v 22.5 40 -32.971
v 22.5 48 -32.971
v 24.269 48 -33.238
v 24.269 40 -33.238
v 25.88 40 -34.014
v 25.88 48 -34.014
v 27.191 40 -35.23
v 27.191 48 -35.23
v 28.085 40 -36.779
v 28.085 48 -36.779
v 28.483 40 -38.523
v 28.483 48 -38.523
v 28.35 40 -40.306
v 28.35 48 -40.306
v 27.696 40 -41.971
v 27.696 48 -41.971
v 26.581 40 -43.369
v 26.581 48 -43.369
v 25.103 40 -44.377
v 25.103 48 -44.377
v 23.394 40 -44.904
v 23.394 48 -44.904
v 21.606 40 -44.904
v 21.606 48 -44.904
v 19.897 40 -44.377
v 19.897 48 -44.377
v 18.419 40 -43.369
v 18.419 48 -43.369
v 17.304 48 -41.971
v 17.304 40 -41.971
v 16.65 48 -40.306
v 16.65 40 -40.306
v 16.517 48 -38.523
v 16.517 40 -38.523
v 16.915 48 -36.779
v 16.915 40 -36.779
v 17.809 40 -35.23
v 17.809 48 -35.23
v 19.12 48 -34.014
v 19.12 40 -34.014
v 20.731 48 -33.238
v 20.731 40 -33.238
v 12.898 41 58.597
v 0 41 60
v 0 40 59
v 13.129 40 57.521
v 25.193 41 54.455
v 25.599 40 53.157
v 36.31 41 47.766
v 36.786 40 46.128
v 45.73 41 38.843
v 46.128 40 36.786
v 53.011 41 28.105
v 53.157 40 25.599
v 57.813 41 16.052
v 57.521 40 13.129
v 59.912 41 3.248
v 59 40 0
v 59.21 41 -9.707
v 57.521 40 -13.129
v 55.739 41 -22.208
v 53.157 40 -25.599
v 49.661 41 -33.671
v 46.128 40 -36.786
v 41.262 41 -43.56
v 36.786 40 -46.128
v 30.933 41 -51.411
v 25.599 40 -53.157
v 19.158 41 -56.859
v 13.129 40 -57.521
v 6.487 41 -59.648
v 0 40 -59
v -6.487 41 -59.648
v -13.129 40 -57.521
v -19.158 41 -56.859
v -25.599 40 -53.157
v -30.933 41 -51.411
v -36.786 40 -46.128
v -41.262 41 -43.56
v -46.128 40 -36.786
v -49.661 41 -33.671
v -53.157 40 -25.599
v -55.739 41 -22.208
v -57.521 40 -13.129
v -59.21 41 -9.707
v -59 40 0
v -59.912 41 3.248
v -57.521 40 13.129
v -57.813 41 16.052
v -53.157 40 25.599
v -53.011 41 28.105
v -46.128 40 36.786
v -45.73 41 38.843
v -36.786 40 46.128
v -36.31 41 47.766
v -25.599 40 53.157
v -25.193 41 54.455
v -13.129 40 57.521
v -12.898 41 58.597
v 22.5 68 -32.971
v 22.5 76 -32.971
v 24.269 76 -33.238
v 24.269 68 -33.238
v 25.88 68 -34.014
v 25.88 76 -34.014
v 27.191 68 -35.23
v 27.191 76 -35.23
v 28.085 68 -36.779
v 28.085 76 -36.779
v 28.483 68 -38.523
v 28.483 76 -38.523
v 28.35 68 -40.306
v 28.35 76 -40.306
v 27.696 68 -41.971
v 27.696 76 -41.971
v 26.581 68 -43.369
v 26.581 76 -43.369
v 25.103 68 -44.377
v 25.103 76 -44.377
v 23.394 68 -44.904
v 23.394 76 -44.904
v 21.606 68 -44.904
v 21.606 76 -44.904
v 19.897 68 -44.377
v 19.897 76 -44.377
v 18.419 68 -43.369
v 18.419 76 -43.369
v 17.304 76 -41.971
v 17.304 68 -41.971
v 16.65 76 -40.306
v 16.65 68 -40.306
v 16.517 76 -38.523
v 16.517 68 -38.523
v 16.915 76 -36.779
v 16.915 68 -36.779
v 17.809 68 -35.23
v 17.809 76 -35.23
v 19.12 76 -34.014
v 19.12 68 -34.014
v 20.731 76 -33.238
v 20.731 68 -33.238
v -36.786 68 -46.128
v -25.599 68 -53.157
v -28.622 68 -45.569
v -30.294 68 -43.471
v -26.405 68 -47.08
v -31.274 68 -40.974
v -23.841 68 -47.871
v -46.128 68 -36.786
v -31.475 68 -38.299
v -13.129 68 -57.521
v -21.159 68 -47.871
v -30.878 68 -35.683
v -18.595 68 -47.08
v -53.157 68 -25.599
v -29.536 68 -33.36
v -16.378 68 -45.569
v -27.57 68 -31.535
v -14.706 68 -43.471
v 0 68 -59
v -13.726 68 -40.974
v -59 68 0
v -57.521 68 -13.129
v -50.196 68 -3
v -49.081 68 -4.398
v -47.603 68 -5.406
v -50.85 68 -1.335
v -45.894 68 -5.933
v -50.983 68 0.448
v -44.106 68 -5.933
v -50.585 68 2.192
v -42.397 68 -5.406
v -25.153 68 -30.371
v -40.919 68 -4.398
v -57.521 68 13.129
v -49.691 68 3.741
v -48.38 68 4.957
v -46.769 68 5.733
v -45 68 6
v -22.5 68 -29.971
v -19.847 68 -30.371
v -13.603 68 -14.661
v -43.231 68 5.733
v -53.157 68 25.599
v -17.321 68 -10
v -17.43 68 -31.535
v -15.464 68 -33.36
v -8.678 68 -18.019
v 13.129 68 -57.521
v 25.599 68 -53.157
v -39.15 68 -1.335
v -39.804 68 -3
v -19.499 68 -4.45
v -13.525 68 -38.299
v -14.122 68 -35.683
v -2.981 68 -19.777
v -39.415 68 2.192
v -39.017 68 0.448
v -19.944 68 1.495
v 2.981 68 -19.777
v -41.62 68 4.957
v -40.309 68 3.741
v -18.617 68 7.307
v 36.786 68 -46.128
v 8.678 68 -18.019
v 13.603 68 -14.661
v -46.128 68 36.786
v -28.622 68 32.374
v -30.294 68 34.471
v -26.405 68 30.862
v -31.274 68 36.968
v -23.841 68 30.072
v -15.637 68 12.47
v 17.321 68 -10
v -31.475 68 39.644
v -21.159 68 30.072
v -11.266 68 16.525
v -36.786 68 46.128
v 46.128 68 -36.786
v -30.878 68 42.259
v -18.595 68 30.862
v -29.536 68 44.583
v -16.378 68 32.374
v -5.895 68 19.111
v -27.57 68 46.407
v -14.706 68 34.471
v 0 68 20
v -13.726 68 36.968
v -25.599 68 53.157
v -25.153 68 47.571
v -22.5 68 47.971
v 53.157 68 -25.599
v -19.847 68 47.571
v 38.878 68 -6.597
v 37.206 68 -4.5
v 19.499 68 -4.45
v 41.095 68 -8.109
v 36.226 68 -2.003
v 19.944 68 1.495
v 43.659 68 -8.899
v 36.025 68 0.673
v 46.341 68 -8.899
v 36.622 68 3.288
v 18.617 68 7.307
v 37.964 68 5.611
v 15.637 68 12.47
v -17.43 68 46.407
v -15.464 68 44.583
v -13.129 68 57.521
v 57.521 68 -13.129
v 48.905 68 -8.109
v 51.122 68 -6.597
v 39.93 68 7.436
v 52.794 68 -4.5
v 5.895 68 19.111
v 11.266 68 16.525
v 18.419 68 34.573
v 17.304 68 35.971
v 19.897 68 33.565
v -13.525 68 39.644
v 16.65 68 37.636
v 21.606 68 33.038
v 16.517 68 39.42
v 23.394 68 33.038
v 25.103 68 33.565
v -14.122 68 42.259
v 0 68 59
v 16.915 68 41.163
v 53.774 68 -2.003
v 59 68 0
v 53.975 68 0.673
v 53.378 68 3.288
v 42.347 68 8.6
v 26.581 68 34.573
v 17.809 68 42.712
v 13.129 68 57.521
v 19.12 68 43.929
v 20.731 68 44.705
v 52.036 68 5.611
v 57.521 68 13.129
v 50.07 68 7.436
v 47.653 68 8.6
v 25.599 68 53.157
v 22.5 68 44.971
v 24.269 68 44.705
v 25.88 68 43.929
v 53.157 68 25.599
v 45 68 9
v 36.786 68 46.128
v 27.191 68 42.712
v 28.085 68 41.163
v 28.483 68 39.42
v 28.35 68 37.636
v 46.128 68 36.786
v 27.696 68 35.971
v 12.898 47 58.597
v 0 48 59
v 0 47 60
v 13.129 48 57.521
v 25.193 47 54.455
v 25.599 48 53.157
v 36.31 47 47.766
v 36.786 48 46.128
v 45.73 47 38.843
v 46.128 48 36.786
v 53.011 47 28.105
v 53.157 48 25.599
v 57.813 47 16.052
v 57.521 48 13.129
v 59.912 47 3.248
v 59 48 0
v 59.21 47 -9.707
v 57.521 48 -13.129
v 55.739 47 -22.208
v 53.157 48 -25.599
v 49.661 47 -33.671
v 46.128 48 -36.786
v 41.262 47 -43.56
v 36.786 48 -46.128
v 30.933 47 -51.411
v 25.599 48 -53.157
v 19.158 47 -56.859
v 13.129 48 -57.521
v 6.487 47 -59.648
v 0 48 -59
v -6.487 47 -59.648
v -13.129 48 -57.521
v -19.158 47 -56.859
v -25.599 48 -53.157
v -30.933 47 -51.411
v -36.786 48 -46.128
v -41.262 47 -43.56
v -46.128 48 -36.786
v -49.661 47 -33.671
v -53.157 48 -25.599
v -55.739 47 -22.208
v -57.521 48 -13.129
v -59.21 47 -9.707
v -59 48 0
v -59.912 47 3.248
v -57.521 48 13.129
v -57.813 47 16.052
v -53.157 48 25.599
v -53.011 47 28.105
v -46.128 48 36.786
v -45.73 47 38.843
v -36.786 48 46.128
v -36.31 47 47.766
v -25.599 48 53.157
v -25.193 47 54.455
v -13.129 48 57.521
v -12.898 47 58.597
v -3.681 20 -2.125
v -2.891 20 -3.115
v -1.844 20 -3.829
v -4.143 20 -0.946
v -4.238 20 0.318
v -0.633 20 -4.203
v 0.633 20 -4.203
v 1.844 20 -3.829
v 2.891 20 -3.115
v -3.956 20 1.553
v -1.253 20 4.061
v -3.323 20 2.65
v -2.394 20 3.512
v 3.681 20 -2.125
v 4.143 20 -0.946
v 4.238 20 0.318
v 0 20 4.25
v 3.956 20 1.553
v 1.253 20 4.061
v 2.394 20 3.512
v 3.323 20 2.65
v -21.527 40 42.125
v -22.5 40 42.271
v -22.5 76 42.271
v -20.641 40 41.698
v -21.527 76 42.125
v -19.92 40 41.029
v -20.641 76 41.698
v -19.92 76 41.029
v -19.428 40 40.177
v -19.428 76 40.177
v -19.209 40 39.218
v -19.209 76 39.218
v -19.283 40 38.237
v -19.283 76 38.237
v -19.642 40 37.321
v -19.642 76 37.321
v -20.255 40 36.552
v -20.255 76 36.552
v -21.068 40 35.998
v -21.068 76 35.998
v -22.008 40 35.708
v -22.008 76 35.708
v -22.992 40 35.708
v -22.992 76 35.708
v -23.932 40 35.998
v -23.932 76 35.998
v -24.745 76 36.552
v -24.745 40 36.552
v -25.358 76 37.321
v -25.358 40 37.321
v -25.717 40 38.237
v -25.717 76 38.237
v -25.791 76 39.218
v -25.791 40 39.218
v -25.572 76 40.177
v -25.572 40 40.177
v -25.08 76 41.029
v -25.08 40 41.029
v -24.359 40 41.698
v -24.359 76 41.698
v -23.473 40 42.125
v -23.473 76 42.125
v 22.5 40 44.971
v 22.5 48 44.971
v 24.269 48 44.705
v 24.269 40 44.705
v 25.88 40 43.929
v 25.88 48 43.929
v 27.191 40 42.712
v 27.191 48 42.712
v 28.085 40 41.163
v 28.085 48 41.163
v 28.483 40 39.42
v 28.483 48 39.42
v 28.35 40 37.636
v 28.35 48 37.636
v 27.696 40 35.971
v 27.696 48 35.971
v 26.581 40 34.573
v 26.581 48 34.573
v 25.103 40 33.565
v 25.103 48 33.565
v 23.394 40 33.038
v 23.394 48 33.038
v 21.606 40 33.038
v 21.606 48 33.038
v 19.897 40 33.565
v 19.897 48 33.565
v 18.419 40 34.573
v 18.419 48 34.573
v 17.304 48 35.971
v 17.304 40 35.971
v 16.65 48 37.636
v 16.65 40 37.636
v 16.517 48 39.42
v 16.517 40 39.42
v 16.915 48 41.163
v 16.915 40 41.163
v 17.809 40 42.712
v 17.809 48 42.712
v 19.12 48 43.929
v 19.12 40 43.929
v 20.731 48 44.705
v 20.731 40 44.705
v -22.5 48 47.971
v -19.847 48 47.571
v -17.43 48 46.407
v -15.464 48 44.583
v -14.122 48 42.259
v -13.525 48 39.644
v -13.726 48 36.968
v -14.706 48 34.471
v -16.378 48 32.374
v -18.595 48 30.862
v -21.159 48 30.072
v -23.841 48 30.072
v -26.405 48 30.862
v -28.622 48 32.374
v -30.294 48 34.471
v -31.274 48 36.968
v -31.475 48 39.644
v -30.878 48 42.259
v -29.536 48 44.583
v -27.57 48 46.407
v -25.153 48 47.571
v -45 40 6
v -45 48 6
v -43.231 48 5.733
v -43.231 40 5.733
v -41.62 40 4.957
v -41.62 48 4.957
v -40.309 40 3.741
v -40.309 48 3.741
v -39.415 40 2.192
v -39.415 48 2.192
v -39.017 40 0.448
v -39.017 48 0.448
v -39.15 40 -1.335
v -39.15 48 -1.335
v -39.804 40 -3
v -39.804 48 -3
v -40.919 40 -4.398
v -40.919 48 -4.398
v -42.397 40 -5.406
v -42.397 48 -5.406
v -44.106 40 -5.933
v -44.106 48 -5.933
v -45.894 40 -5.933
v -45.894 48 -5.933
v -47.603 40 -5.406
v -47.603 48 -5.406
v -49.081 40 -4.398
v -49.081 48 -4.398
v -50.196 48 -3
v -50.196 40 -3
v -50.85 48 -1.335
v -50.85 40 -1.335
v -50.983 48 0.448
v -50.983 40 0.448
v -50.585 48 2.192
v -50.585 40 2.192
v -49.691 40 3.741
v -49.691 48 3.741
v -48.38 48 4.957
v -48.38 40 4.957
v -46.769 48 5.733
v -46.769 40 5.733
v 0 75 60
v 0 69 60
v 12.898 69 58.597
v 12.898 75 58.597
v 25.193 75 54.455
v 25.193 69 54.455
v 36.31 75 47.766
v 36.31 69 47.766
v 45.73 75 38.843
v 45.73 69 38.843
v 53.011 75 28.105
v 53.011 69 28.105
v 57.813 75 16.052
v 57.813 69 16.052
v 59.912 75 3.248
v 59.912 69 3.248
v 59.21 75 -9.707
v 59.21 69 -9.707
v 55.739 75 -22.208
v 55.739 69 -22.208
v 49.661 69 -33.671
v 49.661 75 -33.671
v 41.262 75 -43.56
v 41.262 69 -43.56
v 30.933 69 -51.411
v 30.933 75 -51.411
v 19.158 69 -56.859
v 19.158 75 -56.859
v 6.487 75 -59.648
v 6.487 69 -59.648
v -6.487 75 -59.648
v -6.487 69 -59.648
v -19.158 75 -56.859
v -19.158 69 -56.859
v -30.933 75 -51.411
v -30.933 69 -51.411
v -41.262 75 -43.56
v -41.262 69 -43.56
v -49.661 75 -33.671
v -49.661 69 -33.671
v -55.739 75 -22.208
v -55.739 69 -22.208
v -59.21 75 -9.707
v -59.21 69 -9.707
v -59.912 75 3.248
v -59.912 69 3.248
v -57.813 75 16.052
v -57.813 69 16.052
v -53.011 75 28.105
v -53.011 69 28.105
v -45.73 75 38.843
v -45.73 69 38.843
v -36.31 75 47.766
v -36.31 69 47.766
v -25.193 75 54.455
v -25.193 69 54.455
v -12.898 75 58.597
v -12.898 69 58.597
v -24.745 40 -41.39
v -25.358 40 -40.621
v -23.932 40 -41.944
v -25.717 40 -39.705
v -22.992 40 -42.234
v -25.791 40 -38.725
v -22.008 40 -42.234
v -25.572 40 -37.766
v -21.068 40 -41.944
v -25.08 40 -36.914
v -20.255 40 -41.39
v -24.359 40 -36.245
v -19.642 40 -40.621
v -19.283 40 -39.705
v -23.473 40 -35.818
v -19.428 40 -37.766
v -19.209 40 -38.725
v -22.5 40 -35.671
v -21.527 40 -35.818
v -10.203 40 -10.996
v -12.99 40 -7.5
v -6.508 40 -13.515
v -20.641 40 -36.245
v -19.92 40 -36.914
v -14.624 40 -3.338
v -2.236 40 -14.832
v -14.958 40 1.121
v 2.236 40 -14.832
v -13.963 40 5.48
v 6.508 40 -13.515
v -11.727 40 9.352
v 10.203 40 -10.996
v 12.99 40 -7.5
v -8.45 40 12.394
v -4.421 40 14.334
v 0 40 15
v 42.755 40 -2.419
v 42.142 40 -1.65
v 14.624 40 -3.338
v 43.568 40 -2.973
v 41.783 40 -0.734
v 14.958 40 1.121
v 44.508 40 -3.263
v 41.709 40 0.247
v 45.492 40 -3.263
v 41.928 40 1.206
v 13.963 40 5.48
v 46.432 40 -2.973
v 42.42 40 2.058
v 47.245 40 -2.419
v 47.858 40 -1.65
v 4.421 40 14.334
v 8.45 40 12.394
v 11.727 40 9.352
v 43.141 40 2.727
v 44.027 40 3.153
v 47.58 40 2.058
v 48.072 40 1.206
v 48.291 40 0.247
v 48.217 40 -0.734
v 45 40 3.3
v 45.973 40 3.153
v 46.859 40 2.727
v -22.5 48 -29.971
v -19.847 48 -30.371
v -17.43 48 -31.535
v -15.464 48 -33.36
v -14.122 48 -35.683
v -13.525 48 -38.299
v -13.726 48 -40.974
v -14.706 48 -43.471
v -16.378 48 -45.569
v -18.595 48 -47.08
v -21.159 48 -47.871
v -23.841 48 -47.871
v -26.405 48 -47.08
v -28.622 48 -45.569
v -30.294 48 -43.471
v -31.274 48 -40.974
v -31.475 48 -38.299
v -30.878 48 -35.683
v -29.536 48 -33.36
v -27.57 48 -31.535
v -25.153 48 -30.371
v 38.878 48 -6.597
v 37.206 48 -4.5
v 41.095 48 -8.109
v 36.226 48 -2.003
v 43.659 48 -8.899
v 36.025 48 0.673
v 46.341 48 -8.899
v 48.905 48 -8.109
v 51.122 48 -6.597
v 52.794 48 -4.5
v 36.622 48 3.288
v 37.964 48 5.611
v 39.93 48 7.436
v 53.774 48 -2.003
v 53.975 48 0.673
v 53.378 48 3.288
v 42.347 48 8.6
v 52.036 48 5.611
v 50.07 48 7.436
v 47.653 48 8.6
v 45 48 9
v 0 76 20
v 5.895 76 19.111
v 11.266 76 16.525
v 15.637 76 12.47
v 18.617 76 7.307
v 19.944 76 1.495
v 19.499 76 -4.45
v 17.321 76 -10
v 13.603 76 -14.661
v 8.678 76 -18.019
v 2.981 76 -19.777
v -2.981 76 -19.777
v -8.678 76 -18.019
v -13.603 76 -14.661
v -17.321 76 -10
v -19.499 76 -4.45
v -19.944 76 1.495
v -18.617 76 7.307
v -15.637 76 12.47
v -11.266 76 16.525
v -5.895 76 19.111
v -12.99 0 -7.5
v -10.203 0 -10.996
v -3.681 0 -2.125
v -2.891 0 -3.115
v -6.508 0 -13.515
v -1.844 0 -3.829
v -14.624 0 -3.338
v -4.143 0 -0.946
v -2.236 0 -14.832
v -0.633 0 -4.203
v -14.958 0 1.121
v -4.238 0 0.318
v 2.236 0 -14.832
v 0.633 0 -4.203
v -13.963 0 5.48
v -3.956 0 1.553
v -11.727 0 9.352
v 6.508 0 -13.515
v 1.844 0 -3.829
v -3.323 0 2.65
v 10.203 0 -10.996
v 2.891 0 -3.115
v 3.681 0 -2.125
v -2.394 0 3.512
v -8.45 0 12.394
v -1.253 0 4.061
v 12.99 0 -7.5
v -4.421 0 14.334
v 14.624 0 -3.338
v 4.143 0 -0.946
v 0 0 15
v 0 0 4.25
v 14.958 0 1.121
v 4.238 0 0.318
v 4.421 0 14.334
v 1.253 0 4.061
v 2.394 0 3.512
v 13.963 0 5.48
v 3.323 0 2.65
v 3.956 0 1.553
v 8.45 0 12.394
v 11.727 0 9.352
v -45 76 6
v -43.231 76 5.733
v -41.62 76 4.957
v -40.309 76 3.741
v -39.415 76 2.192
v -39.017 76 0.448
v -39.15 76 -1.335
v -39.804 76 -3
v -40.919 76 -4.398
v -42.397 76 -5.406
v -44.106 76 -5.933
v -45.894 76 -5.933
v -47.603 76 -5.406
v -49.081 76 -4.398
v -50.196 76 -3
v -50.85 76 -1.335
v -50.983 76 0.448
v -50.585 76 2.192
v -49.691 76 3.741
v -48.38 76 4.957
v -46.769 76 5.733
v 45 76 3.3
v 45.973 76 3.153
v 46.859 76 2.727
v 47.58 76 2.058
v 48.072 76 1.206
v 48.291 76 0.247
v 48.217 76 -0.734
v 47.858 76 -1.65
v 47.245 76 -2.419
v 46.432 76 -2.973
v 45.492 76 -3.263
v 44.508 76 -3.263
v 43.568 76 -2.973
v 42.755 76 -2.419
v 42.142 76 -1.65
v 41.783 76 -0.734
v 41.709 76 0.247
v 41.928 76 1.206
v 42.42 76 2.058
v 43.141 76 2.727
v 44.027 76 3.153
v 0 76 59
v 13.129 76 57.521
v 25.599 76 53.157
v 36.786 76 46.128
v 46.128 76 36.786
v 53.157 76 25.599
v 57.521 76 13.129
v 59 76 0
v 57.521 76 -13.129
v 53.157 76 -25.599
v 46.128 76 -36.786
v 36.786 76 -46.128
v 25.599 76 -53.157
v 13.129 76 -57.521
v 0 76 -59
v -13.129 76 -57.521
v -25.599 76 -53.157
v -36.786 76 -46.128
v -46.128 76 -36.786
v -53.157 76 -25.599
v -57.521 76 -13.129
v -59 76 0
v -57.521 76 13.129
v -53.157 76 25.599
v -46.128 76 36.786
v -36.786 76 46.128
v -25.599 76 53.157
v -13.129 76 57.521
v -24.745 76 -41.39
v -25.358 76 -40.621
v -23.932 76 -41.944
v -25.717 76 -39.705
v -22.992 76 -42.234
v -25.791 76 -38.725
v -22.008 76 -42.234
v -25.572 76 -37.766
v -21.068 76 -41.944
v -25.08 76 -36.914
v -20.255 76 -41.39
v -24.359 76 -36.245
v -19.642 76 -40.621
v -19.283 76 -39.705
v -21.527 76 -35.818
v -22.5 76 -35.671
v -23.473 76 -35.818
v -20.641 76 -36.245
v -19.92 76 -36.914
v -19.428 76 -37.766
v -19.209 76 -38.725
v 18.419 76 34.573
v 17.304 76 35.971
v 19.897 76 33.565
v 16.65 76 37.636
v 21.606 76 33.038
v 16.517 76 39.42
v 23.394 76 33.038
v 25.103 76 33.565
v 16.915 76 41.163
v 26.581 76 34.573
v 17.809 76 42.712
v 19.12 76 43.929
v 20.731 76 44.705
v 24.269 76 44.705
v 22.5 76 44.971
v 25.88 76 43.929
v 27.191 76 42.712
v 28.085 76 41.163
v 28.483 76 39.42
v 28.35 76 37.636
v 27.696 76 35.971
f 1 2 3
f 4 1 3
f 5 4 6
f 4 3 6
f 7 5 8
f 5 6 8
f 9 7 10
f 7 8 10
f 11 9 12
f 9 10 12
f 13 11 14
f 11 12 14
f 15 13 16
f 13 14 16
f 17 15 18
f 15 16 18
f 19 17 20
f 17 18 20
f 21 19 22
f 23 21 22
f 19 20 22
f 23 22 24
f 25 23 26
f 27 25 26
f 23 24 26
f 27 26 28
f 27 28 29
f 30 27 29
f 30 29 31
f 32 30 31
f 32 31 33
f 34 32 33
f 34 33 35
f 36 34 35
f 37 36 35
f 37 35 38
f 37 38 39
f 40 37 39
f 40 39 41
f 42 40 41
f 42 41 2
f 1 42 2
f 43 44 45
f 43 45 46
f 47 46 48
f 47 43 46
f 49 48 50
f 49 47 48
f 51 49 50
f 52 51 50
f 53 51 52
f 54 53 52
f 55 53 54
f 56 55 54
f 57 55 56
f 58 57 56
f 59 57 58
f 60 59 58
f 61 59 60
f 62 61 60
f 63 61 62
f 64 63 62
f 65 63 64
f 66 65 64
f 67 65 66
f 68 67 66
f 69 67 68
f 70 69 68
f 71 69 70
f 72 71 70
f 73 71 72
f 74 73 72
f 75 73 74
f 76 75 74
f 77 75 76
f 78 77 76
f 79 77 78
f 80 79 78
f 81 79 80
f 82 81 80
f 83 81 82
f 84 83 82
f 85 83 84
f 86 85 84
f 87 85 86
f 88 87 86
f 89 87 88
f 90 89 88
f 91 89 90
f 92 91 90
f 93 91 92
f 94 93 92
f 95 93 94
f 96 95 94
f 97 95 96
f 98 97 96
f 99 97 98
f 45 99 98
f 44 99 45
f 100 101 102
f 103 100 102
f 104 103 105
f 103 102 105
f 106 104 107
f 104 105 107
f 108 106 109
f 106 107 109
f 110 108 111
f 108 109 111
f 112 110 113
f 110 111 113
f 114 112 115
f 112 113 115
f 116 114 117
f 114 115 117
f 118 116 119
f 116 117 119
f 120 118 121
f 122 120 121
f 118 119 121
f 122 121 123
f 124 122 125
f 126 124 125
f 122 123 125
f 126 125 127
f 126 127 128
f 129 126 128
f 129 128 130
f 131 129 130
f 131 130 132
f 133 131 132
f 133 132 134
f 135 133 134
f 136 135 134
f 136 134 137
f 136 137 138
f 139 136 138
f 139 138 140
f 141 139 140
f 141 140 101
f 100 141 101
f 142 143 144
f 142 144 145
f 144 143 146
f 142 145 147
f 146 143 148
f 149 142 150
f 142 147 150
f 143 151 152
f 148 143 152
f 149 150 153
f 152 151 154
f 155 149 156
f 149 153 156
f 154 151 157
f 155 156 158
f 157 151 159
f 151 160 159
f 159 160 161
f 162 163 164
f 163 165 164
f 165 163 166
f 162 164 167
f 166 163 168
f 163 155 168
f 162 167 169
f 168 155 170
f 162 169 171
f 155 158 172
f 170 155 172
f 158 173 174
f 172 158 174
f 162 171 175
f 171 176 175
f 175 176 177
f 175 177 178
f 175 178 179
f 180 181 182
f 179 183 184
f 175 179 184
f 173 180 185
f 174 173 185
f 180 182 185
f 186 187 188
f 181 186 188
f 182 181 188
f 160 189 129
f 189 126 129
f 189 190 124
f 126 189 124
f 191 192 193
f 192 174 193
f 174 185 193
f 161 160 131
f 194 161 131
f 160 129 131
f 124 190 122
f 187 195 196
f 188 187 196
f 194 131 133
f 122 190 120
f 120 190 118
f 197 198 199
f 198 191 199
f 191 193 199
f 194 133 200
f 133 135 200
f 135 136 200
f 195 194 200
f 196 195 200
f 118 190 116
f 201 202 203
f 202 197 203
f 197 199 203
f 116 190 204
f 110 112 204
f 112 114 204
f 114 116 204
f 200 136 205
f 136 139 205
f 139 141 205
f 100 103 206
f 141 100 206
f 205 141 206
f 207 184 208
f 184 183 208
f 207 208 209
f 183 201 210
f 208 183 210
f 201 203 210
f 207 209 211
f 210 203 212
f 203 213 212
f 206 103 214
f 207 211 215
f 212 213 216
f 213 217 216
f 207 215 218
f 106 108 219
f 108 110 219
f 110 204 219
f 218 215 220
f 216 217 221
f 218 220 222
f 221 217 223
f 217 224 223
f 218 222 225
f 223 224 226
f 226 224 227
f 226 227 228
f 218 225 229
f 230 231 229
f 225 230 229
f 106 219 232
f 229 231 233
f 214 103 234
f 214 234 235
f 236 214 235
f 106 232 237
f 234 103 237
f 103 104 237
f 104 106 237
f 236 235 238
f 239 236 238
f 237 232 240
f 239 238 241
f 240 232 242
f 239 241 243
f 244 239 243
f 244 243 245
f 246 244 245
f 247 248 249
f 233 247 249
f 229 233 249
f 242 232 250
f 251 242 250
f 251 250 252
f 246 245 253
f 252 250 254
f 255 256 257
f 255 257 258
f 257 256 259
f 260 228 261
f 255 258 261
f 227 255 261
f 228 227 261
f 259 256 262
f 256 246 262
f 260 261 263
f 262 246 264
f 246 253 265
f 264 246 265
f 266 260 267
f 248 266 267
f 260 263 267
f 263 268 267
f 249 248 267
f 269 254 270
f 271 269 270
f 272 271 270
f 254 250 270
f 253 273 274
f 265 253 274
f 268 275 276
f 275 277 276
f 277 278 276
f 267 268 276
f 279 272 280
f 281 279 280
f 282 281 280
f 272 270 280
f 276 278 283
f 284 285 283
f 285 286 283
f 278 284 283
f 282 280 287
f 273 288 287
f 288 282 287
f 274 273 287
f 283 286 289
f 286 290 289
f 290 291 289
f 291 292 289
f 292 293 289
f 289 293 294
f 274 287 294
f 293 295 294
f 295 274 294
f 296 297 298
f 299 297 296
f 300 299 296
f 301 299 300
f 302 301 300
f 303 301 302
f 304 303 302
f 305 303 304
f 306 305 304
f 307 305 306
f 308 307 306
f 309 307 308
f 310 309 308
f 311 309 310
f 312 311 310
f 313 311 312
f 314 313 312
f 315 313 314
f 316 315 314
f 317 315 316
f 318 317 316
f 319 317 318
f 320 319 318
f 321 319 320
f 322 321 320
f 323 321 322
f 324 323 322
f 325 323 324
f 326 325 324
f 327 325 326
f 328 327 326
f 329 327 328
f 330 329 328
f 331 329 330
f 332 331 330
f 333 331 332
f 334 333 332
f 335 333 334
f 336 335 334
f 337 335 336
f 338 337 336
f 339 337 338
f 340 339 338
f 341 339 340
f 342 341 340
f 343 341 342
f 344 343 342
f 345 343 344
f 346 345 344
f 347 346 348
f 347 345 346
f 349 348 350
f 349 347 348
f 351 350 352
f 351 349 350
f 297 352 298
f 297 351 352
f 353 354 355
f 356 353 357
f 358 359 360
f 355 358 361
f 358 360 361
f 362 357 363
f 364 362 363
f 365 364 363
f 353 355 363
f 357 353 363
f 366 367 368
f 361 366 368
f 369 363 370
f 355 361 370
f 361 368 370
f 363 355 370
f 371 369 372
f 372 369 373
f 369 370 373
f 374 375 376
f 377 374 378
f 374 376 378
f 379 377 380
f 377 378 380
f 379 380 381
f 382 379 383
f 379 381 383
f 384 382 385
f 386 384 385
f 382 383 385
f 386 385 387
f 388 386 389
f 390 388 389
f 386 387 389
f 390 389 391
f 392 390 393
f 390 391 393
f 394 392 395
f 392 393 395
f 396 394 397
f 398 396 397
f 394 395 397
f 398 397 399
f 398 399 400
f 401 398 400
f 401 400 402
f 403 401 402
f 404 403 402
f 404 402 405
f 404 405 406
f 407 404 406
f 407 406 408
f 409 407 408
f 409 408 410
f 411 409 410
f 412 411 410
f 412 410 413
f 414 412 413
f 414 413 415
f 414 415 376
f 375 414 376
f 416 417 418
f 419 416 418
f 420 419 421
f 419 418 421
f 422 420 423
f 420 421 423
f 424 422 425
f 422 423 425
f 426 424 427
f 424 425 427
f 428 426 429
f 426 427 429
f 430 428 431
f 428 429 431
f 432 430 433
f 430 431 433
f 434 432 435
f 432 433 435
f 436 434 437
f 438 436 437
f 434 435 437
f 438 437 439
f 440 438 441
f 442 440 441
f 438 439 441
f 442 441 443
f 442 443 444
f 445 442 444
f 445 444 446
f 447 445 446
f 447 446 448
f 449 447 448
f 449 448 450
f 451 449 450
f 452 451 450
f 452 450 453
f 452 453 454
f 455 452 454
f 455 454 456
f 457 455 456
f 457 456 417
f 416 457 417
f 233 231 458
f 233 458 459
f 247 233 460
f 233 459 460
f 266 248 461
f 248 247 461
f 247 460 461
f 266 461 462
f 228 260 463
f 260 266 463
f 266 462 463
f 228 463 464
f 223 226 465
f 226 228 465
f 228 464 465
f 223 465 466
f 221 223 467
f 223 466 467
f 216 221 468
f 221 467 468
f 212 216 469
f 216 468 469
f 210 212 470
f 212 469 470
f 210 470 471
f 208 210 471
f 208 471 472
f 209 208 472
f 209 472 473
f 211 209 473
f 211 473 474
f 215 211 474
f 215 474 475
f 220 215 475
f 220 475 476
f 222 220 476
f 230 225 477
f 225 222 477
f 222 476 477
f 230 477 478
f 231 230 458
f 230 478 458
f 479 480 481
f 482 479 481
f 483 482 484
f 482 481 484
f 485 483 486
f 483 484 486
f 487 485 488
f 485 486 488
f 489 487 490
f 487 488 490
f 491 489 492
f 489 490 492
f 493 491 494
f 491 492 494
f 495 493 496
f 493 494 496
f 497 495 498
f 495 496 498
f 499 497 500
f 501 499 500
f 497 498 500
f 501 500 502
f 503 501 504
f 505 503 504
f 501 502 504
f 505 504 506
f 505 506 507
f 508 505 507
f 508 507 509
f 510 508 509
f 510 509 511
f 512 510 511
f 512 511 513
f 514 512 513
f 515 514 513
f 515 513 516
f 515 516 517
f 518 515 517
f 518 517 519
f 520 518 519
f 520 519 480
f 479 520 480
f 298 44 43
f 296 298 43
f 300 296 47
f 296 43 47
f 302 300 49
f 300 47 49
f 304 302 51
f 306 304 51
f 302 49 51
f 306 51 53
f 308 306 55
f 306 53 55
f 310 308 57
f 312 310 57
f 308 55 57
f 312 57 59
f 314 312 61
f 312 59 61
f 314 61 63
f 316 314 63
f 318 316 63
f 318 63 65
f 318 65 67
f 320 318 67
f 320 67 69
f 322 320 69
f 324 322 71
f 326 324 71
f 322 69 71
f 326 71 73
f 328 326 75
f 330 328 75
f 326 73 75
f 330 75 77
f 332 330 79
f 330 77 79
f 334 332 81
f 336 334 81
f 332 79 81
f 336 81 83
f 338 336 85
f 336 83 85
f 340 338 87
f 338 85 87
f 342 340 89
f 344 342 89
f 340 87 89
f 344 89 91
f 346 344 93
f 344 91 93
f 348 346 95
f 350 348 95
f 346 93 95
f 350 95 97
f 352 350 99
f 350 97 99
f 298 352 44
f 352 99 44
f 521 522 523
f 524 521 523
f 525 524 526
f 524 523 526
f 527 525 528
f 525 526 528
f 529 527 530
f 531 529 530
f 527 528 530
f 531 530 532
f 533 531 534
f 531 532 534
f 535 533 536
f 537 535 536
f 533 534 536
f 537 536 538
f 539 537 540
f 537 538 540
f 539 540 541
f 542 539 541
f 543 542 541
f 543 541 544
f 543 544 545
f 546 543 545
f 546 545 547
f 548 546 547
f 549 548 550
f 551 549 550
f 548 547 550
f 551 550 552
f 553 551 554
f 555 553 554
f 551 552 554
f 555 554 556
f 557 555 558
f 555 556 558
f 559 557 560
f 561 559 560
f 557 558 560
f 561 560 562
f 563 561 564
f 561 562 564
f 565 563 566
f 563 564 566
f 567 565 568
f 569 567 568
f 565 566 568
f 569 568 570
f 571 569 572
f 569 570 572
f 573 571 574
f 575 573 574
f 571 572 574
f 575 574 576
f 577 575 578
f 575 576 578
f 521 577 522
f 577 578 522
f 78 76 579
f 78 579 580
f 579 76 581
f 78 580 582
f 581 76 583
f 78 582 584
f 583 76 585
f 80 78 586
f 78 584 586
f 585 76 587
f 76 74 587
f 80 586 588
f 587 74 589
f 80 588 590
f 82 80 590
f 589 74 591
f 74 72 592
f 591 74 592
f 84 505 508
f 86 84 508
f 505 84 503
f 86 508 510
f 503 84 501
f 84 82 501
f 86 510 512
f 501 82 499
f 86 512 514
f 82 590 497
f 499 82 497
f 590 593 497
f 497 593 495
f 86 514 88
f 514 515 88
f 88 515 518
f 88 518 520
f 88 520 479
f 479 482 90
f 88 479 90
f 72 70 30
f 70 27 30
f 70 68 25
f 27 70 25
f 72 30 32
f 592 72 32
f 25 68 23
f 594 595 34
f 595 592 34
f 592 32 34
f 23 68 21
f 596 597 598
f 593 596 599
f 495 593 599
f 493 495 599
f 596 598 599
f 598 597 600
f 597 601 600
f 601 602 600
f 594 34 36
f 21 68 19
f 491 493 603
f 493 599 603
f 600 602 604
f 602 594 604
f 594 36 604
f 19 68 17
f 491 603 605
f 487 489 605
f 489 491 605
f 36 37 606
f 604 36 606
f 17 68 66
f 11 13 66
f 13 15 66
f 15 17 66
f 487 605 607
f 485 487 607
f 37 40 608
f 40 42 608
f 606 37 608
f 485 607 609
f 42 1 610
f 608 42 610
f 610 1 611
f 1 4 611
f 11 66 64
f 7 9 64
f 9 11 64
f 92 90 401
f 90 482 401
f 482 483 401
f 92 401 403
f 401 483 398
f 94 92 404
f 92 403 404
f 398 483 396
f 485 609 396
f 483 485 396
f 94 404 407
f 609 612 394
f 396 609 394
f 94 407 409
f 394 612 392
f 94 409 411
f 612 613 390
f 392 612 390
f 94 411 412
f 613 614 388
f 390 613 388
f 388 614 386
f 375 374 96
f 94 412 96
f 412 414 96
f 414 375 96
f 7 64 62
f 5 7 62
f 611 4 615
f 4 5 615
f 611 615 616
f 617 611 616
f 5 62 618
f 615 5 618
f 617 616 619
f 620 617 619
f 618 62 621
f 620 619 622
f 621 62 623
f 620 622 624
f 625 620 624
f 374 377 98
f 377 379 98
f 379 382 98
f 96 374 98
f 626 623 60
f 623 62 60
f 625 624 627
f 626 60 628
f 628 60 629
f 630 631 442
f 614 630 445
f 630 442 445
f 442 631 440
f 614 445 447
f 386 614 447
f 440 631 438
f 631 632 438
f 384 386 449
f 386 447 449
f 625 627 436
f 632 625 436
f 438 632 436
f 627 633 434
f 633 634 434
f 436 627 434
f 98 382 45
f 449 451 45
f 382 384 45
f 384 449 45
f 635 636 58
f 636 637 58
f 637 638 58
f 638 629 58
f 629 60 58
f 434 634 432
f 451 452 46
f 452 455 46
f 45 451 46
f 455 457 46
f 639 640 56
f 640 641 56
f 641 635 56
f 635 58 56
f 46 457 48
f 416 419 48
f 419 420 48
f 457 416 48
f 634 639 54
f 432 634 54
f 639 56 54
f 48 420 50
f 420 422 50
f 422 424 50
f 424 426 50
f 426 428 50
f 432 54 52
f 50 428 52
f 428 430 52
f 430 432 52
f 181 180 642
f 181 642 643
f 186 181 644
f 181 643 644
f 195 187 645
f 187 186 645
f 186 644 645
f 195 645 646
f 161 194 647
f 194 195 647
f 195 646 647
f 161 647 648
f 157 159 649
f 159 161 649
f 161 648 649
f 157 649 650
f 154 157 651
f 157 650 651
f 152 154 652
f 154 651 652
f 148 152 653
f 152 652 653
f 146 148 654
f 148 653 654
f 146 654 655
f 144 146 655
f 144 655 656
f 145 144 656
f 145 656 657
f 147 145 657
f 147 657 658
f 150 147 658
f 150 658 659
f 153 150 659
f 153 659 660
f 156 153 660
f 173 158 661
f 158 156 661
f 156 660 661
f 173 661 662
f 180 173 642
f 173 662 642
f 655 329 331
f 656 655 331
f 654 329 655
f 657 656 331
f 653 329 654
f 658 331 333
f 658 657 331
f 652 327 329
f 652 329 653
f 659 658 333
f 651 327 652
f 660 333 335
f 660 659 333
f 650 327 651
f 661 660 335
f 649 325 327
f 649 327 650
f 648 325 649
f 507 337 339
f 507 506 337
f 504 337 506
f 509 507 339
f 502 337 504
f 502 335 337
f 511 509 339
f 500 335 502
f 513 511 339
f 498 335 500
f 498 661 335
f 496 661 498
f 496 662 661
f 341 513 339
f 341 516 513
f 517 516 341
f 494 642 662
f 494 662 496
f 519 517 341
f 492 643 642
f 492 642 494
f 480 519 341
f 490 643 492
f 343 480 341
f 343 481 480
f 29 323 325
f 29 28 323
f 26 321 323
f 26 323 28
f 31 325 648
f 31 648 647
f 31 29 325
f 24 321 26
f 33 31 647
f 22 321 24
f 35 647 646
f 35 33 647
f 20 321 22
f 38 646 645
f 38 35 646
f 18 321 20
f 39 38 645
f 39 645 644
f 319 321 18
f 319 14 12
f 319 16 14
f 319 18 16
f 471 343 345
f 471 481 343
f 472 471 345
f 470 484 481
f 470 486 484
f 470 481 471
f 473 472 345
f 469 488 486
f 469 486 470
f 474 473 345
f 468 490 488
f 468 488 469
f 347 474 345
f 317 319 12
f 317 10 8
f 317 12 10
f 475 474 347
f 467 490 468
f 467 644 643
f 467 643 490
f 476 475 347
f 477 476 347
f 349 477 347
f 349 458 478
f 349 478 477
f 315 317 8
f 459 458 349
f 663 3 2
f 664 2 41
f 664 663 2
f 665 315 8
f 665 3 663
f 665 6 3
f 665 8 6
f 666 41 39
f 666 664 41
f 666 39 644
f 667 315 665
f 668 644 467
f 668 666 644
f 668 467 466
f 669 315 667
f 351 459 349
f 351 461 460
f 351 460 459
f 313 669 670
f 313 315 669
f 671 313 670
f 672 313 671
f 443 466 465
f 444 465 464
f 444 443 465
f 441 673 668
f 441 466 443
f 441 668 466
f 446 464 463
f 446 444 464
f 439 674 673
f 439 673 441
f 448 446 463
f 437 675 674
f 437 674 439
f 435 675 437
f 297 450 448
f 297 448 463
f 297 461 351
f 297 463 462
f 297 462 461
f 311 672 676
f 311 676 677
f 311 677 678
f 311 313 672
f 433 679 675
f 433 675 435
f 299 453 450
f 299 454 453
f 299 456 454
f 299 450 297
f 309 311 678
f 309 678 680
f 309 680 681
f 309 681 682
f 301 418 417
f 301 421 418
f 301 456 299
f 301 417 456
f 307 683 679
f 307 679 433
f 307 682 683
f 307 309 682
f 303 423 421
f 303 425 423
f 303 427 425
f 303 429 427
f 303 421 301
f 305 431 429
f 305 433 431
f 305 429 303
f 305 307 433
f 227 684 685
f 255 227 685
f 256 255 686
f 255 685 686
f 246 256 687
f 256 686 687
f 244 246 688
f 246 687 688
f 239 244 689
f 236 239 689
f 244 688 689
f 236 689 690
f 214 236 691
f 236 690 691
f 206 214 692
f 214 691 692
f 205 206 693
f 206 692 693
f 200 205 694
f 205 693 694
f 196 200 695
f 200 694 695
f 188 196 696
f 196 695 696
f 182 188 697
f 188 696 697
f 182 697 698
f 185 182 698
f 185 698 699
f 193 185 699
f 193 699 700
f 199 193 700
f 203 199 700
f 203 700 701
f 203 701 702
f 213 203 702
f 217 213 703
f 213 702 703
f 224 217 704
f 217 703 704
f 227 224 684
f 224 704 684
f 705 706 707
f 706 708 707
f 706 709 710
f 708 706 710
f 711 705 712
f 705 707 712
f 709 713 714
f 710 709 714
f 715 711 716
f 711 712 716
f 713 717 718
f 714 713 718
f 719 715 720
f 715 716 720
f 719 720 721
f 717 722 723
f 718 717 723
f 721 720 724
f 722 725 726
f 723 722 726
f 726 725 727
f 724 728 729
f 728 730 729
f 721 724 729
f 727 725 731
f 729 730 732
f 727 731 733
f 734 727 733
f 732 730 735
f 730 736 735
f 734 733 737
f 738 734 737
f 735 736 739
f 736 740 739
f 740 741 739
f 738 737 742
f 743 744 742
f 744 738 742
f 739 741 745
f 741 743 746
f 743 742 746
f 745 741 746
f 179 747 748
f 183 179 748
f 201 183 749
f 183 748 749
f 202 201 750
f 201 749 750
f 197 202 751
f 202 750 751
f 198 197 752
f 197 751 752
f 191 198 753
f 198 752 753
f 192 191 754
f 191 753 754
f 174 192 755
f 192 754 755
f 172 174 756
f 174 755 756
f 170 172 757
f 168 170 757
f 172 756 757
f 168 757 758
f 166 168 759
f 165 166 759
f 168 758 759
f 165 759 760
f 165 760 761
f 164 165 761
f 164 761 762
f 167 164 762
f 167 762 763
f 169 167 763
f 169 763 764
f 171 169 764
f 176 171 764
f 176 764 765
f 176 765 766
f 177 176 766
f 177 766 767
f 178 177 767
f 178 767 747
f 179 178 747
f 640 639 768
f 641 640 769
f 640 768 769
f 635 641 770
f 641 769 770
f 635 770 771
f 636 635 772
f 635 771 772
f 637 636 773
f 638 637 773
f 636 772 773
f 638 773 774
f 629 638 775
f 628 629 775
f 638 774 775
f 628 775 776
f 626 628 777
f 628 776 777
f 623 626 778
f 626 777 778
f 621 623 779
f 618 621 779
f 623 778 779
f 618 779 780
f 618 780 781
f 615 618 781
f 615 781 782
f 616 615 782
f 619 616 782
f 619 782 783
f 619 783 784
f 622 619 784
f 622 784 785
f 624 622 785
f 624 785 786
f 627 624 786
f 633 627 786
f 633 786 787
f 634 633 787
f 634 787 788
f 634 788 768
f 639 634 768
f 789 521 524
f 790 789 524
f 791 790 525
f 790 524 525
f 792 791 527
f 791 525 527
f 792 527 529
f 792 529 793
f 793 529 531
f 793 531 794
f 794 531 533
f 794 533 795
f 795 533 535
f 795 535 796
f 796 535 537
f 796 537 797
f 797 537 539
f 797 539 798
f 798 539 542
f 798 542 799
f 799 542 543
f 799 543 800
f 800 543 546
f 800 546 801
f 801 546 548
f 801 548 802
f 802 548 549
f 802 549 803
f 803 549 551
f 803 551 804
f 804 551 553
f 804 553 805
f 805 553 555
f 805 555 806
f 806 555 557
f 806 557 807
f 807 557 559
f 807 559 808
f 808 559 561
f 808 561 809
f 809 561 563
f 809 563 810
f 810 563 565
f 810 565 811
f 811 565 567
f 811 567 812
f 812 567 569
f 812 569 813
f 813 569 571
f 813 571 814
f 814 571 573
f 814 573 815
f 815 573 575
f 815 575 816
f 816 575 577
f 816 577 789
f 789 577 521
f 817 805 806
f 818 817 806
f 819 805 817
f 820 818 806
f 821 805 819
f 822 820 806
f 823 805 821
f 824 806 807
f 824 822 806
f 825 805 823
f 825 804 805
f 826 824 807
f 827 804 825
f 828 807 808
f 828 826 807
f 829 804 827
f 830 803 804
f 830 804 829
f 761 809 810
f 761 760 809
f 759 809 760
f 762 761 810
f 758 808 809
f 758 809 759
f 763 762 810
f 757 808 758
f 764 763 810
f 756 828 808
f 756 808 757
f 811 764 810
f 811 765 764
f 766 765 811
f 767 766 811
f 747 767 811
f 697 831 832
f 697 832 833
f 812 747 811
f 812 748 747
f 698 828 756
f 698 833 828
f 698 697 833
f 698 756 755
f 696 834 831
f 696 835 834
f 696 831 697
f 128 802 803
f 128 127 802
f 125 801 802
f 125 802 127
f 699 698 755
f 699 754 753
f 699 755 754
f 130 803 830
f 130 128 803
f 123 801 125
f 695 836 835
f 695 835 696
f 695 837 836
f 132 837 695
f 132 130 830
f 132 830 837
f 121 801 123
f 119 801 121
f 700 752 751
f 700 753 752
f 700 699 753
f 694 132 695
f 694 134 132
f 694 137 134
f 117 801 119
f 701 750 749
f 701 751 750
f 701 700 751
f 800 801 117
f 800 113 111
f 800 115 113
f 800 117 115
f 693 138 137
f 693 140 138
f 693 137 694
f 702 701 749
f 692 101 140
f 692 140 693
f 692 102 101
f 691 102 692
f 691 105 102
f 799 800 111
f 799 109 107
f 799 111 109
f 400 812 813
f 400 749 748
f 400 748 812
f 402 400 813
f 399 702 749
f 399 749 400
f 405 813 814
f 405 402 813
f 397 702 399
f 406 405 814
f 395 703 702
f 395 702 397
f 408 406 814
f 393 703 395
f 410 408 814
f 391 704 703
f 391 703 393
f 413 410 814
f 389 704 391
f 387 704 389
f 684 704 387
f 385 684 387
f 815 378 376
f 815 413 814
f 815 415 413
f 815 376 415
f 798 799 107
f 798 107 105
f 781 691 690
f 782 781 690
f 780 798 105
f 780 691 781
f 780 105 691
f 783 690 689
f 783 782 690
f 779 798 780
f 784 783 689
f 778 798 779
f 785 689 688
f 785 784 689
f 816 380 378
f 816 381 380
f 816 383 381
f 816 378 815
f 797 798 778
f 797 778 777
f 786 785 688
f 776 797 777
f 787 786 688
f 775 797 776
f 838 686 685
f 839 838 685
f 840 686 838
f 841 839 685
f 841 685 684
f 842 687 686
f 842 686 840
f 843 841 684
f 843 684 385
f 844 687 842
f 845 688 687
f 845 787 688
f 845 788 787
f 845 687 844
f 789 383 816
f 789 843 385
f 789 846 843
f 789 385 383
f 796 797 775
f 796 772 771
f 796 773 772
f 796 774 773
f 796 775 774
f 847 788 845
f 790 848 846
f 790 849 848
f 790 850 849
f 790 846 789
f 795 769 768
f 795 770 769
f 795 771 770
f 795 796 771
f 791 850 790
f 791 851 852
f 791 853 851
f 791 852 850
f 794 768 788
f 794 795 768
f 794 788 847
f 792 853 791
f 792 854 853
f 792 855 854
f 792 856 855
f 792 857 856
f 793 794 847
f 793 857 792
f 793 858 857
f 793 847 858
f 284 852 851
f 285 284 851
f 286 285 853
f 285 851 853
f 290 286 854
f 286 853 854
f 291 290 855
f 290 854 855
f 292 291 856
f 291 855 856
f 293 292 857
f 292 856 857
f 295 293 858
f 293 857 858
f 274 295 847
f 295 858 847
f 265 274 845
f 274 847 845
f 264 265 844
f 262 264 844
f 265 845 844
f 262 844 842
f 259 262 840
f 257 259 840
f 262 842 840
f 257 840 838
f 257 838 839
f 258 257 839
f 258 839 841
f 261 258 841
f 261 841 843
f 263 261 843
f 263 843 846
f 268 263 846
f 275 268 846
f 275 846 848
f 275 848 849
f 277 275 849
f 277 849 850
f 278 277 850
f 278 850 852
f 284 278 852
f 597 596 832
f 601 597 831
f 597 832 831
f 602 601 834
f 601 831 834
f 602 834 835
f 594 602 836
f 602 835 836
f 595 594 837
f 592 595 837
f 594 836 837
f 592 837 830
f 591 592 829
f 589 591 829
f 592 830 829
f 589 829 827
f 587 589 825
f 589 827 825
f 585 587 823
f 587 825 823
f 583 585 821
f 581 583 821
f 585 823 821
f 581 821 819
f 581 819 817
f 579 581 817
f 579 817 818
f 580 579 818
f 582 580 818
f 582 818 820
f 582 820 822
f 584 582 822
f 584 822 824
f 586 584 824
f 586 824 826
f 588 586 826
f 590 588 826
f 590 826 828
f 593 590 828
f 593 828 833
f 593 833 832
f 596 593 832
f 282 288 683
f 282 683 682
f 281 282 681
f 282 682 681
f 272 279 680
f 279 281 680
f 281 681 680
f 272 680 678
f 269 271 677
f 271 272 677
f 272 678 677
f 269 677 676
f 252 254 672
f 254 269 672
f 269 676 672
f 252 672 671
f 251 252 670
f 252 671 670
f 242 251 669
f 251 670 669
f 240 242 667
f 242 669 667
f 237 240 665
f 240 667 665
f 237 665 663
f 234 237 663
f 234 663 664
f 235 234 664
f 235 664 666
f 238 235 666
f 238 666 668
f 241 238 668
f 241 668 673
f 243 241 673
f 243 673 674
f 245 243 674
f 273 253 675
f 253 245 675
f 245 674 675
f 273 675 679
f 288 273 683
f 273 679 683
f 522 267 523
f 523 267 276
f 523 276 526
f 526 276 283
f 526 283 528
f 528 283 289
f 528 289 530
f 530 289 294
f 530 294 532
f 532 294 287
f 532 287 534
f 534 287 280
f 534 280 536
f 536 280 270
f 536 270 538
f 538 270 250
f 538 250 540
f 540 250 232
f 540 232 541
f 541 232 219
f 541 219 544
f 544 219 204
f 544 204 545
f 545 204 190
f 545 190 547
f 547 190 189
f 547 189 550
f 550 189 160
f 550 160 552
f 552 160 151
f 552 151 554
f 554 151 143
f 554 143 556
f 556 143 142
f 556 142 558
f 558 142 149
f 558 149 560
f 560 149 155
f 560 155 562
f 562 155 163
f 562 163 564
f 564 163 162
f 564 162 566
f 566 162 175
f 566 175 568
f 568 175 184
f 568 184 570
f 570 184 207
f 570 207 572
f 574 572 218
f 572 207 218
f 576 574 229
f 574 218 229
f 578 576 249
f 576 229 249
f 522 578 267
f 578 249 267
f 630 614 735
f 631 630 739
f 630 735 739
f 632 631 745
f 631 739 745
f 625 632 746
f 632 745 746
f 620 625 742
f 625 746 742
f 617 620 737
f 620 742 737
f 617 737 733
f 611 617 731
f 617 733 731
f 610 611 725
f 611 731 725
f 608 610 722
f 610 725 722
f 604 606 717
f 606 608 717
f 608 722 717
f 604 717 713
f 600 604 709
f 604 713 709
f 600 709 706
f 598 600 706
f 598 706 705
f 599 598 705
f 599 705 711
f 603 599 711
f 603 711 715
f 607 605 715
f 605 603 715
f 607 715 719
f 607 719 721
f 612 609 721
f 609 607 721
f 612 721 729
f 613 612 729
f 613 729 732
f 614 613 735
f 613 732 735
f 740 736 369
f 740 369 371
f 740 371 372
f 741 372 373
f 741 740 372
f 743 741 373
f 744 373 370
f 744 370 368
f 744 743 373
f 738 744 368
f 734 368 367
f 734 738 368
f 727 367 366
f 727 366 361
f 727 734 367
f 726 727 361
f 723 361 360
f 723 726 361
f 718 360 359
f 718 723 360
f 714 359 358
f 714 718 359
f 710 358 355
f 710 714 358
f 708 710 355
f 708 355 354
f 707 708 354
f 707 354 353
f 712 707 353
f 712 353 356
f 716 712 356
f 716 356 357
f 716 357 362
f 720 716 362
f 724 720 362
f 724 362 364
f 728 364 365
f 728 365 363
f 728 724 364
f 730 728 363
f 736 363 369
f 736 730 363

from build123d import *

# Parameters (mm, degrees)
SKETCH_1_R          = 60
EXTRUDE_1_DEPTH     = 8
SKETCH_3_R          = 9
EXTRUDE_3_DEPTH     = 36
SKETCH_4_R          = 60
EXTRUDE_4_DEPTH     = 8
SKETCH_5_R          = 15
EXTRUDE_5_DEPTH     = 48
SKETCH_6_R          = 3.3
CUT_EXTRUDE_1_DEPTH = 114.912246927
SKETCH_7_R          = 6
CUT_EXTRUDE_2_DEPTH = 114.912246927
SKETCH_8_R          = 20
CUT_EXTRUDE_3_DEPTH = 8
SKETCH_9_R          = 4.25
CUT_EXTRUDE_4_DEPTH = 20
CHAMFER_1_SIZE      = 1


with BuildPart() as part:
    # 草图1 → 凸台-拉伸1 (new body)
    with BuildSketch(Plane(origin=(0, 40, 0), x_dir=(1, 0, 0), z_dir=(0, 1, 0))):
        with Locations(Location((0, 0, 0), (0, 0, 270))):
            Circle(SKETCH_1_R)
    extrude(amount=EXTRUDE_1_DEPTH)

    # 草图3 → 凸台-拉伸3 (add)
    with BuildSketch(Plane(origin=(0, 40, 0), x_dir=(1, 0, 0), z_dir=(0, 1, 0))):
        with Locations(Location((45, 0, 0), (0, 0, 270))):
            Circle(SKETCH_3_R)
        with Locations(Location((-22.5, -38.971143, 0), (0, 0, 270))):
            Circle(SKETCH_3_R)
        with Locations(Location((-22.5, 38.971143, 0), (0, 0, 270))):
            Circle(SKETCH_3_R)
    extrude(amount=EXTRUDE_3_DEPTH)

    # 草图4 → 凸台-拉伸4 (add)
    with BuildSketch(Plane(origin=(0, 68, 0), x_dir=(1, 0, 0), z_dir=(0, 1, 0))):
        with Locations(Location((0, 0, 0), (0, 0, 270))):
            Circle(SKETCH_4_R)
    extrude(amount=EXTRUDE_4_DEPTH)

    # 草图5 → 凸台-拉伸5 (add)
    with BuildSketch(Plane(origin=(0, 0, 0), x_dir=(1, 0, 0), z_dir=(0, 1, 0))):
        with Locations(Location((0, 0, 0), (0, 0, 270))):
            Circle(SKETCH_5_R)
    extrude(amount=EXTRUDE_5_DEPTH)

    # 草图6 → 切除-拉伸1 (cut, through all)
    with BuildSketch(Plane(origin=(0, 76, 0), x_dir=(1, 0, 0), z_dir=(0, 1, 0))):
        with Locations(Location((45, 0, 0), (0, 0, 270))):
            Circle(SKETCH_6_R)
        with Locations(Location((-22.5, -38.971143, 0), (0, 0, 270))):
            Circle(SKETCH_6_R)
        with Locations(Location((-22.5, 38.971143, 0), (0, 0, 270))):
            Circle(SKETCH_6_R)
    extrude(amount=-CUT_EXTRUDE_1_DEPTH, mode=Mode.SUBTRACT)

    # 草图7 → 切除-拉伸2 (cut, through all)
    with BuildSketch(Plane(origin=(0, 76, 0), x_dir=(1, 0, 0), z_dir=(0, 1, 0))):
        with Locations(Location((22.5, -38.971143, 0), (0, 0, 270))):
            Circle(SKETCH_7_R)
        with Locations(Location((-45, 0, 0), (0, 0, 270))):
            Circle(SKETCH_7_R)
        with Locations(Location((22.5, 38.971143, 0), (0, 0, 270))):
            Circle(SKETCH_7_R)
    extrude(amount=-CUT_EXTRUDE_2_DEPTH, mode=Mode.SUBTRACT)

    # 草图8 → 切除-拉伸3 (cut)
    with BuildSketch(Plane(origin=(0, 76, 0), x_dir=(1, 0, 0), z_dir=(0, 1, 0))):
        with Locations(Location((0, 0, 0), (0, 0, 270))):
            Circle(SKETCH_8_R)
    extrude(amount=-CUT_EXTRUDE_3_DEPTH, mode=Mode.SUBTRACT)

    # 草图9 → 切除-拉伸4 (cut)
    with BuildSketch(Plane(origin=(0, 0, 0), x_dir=(1, 0, 0), z_dir=(0, 1, 0))):
        with Locations(Location((0, 0, 0), (0, 0, 270))):
            Circle(SKETCH_9_R)
    extrude(amount=CUT_EXTRUDE_4_DEPTH, mode=Mode.SUBTRACT)

    # 倒角1
    chamfer_1_edges = [part.edges().sort_by_distance(p)[0] for p in [
        (0, 40, -60),
        (0, 68, -60),
        (0, 76, -60),
        (0, 48, -60),
    ]]
    chamfer(chamfer_1_edges, length=CHAMFER_1_SIZE)


solid = part.part
